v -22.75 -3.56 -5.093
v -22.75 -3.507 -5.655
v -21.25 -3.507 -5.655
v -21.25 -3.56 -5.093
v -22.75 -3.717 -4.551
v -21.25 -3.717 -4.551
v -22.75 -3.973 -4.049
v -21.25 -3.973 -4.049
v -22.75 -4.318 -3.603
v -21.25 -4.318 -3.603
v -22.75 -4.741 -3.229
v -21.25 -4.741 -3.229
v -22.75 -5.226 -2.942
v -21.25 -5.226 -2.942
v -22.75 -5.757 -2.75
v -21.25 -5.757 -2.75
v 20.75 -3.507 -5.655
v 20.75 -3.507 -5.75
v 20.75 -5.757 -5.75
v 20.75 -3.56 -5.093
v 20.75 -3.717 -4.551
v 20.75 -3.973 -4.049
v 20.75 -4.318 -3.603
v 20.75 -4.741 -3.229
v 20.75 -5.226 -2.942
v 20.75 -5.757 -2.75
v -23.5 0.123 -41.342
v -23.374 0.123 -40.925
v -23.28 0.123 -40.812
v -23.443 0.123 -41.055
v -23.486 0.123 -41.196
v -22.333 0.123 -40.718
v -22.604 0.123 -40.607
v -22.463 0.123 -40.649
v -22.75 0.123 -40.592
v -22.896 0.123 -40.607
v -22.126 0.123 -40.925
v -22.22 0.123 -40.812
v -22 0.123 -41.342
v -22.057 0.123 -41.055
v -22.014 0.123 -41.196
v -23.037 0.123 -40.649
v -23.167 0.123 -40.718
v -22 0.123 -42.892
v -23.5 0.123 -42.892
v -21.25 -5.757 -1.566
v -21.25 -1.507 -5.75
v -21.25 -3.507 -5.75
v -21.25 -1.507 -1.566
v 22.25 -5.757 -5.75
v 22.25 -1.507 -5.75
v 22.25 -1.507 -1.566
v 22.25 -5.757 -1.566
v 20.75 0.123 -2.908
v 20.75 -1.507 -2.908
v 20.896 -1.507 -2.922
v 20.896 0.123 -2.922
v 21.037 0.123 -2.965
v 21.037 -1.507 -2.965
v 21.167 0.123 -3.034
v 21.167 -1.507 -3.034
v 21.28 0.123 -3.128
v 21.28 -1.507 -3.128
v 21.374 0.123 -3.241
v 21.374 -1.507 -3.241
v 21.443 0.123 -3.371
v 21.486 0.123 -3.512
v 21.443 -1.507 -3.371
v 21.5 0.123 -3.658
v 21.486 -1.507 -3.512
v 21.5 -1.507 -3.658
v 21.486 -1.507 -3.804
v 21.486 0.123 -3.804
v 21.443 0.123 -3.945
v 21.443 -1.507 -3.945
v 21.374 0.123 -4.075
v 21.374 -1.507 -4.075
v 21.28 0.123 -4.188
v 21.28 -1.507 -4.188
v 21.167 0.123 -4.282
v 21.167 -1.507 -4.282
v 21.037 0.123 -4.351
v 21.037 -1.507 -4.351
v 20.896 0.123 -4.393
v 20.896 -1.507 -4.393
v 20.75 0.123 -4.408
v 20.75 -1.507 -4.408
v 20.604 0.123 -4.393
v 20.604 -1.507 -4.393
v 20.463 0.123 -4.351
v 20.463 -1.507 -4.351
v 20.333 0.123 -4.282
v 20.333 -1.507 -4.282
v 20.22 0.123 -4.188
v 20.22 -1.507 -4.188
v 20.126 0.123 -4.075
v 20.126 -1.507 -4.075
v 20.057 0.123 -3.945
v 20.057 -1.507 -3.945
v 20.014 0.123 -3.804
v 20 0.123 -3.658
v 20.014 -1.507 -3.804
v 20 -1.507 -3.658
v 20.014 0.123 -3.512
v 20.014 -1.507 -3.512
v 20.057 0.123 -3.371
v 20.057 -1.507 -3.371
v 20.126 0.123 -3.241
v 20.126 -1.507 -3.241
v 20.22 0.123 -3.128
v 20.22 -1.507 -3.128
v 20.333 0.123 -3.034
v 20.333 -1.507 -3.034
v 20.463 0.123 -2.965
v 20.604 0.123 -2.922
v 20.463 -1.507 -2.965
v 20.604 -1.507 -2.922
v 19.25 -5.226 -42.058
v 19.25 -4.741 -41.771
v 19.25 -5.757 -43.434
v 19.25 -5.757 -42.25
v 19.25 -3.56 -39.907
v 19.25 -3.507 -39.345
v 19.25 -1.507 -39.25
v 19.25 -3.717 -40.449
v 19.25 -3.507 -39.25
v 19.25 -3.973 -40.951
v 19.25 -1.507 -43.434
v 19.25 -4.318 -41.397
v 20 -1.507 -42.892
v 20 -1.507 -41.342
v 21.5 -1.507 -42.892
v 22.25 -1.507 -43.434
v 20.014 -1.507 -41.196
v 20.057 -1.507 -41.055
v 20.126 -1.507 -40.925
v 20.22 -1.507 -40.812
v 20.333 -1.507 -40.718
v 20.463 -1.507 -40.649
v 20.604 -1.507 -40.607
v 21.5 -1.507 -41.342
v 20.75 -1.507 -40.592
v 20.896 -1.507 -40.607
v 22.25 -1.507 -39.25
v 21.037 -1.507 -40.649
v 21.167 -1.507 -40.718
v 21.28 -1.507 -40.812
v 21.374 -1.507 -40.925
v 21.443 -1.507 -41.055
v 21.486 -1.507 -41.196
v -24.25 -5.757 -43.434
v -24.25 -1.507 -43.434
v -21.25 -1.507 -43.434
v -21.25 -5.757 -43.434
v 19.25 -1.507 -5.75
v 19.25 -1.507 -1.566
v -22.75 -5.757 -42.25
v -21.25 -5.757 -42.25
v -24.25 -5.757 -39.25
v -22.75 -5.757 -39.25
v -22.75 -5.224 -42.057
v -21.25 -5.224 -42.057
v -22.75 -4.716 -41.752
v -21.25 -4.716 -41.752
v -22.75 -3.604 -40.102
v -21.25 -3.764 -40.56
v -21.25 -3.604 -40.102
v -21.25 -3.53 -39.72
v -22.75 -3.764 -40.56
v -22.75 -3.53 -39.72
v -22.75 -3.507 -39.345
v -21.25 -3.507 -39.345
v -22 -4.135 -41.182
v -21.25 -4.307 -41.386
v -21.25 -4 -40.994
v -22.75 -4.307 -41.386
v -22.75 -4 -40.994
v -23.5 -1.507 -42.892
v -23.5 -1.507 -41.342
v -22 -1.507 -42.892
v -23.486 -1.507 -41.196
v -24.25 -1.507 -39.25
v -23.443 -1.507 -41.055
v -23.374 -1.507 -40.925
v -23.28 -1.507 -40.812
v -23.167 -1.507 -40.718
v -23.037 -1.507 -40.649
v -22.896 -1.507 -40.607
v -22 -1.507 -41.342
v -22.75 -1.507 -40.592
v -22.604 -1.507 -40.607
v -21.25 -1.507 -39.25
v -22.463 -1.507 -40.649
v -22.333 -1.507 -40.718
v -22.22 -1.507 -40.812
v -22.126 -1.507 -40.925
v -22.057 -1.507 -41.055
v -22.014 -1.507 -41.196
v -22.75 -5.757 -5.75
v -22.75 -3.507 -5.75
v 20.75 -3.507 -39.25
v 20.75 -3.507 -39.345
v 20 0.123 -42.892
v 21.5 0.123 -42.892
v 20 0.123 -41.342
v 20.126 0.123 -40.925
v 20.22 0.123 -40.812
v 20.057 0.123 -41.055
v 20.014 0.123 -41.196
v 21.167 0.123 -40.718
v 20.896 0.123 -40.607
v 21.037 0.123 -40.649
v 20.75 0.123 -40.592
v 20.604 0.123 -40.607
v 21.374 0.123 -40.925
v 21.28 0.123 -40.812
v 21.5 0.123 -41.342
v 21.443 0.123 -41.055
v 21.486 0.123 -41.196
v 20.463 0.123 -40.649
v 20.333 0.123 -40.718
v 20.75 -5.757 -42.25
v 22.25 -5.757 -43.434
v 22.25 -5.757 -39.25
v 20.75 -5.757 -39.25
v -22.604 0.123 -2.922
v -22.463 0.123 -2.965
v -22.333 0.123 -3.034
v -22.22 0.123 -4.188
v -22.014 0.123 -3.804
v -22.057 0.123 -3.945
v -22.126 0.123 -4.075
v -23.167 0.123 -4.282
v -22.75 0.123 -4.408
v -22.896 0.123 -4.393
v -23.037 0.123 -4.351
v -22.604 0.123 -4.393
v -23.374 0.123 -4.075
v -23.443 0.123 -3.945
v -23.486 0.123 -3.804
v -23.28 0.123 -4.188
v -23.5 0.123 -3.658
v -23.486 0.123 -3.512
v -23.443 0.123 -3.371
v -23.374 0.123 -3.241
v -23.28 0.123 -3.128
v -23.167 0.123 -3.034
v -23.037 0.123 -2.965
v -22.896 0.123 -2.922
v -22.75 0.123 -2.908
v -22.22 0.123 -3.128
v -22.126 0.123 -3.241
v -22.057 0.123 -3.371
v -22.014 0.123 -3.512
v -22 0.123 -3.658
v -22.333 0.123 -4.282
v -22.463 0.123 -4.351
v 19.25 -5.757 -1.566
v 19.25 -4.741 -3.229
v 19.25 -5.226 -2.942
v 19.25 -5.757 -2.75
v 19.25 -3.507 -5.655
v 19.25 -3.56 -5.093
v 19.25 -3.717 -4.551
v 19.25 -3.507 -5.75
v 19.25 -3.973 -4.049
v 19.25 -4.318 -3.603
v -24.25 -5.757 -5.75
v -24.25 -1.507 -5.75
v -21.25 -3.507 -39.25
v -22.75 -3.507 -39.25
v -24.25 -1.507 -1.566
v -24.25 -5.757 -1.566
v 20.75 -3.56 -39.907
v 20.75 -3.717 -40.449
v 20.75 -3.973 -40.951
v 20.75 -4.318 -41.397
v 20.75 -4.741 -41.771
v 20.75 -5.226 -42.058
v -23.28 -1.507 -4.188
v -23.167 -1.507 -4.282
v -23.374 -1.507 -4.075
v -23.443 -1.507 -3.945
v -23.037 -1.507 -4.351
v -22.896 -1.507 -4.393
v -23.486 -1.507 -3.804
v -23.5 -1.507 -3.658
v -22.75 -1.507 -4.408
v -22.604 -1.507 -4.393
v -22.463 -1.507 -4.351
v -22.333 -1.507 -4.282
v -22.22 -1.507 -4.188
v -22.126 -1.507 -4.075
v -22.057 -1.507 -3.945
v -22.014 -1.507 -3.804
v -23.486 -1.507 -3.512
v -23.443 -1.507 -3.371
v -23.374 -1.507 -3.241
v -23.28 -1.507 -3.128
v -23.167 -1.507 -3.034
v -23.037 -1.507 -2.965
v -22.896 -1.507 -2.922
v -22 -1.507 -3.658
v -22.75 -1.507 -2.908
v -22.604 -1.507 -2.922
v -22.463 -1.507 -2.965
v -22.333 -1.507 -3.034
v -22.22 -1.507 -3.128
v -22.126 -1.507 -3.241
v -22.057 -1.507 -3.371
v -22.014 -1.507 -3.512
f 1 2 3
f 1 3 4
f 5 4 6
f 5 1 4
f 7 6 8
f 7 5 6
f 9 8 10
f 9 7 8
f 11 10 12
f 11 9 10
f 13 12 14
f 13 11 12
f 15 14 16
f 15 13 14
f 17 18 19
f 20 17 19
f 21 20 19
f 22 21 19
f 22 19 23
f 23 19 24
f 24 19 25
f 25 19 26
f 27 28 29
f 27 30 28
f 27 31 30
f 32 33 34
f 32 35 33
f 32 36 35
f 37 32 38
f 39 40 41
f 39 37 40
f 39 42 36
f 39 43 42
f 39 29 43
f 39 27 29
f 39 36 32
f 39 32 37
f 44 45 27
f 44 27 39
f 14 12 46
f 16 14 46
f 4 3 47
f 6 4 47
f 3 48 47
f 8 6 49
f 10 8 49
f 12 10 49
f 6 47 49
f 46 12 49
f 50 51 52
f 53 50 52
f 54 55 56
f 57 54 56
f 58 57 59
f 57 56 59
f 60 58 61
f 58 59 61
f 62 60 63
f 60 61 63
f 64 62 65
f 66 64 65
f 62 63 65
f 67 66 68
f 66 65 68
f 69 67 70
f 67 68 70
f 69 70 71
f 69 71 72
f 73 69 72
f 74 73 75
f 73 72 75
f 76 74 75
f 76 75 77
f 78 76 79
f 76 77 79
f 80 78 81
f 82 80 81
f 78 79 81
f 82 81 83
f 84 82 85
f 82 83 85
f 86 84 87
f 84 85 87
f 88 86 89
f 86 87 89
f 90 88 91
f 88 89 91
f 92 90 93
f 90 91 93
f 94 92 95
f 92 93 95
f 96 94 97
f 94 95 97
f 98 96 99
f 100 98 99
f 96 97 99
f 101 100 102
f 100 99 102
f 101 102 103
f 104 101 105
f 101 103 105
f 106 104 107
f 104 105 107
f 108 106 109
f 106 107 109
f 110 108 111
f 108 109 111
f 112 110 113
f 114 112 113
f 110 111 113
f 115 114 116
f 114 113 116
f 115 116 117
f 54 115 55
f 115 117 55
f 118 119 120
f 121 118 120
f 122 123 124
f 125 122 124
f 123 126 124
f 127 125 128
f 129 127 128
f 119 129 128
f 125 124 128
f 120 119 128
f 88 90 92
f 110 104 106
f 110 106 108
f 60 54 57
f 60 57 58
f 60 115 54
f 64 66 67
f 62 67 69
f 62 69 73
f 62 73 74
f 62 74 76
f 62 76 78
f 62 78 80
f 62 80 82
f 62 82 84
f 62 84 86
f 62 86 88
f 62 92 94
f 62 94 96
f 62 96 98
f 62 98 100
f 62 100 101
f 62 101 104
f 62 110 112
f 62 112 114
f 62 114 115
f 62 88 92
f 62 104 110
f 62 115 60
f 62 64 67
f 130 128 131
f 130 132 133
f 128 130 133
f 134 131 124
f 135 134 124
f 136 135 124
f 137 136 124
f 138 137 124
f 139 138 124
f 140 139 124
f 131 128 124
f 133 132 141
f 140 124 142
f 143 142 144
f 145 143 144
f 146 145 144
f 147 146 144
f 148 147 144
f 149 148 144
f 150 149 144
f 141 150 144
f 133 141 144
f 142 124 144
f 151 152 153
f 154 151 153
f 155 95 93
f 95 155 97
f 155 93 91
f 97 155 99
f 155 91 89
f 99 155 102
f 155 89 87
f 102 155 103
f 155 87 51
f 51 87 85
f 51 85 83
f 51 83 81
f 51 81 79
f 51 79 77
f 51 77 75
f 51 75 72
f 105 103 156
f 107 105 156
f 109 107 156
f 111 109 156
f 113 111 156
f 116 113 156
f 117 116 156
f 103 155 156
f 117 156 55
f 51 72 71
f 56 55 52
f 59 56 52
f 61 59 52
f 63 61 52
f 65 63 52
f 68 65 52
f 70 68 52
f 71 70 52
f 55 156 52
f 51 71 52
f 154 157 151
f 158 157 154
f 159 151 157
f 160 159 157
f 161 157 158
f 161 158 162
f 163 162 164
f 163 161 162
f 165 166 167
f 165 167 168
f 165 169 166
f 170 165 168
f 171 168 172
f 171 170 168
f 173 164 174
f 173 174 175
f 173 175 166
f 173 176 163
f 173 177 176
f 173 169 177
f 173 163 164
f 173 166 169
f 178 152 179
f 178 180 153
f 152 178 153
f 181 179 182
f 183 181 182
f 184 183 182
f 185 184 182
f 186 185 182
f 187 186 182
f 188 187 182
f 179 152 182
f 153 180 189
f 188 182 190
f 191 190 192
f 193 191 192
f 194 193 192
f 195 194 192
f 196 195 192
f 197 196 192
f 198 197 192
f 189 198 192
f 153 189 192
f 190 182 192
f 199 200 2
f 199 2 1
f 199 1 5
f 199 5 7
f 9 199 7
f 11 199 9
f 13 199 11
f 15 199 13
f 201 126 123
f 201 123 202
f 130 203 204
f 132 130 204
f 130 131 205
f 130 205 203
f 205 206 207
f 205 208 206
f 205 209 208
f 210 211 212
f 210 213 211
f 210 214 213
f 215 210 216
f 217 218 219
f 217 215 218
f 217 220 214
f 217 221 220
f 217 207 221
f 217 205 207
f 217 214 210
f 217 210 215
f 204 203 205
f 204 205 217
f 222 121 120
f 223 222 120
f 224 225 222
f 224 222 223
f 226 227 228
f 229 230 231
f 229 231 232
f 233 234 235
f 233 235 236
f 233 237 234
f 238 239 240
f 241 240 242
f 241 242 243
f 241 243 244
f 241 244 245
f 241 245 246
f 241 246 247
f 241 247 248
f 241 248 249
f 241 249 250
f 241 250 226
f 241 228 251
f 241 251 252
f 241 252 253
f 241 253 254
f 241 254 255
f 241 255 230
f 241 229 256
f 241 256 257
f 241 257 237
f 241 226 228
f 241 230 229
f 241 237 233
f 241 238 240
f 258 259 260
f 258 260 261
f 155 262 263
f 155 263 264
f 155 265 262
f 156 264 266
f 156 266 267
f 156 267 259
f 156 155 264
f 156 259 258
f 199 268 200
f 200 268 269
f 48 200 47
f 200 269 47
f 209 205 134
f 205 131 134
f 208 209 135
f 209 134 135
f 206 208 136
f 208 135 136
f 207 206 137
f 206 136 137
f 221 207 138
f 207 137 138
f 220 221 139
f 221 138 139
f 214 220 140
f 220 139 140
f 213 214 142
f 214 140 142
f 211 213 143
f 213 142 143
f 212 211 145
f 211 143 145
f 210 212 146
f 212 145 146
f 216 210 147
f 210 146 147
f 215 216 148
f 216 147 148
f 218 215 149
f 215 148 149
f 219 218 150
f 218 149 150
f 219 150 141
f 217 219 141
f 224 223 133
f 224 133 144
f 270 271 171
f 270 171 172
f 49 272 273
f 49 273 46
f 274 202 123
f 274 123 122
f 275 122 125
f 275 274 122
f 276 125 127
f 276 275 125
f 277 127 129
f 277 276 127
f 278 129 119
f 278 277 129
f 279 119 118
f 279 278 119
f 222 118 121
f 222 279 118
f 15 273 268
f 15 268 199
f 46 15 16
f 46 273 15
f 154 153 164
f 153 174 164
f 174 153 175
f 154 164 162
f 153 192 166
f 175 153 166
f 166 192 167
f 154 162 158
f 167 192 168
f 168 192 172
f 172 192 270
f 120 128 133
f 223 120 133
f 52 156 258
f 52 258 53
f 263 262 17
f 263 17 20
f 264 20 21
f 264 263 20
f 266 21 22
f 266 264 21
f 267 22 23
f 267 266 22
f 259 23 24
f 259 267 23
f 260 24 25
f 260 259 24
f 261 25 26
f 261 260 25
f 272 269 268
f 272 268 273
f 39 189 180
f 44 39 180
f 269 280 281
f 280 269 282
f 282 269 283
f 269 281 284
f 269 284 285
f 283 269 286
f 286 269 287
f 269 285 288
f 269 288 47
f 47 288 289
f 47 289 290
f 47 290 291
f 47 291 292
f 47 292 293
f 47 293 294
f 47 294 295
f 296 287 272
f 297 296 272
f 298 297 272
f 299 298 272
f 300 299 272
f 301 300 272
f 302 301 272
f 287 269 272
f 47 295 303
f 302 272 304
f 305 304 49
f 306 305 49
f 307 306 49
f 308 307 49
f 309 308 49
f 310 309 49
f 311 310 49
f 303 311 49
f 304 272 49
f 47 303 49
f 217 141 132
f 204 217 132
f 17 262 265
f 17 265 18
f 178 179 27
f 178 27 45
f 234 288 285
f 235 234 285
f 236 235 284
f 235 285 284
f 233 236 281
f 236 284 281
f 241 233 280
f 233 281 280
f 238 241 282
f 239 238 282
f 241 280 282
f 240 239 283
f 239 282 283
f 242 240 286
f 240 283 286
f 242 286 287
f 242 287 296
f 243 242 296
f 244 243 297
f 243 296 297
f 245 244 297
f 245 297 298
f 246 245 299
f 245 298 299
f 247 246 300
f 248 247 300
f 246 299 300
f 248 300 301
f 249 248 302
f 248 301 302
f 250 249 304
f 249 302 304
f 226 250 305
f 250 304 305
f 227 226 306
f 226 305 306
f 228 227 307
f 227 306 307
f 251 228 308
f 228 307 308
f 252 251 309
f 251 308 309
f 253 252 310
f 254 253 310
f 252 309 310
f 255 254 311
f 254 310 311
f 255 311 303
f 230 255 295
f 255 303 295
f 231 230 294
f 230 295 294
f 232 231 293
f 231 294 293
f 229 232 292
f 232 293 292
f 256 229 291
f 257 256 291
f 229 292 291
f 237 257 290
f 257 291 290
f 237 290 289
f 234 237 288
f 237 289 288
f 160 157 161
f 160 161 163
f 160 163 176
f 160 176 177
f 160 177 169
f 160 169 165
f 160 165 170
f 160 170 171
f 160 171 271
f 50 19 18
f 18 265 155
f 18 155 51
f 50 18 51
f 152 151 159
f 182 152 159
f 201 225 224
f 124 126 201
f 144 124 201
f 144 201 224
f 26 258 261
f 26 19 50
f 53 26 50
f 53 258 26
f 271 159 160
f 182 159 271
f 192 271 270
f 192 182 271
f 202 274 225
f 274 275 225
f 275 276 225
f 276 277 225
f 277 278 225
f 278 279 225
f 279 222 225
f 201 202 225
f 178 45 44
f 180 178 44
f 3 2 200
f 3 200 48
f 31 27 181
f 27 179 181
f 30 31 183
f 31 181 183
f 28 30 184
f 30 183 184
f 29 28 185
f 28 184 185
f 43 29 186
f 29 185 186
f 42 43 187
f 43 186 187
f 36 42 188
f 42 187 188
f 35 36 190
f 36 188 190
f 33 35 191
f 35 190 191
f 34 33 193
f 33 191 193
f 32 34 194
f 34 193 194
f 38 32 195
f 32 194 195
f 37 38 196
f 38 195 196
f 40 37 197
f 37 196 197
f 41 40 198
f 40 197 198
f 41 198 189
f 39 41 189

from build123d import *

# Parameters (mm, degrees)
SKETCH1_W             = 3
SKETCH1_H             = 4.18419334
BOSS_EXTRUDE1_DEPTH   = 4.25
BOSS_EXTRUDE1_2_DEPTH = 4.25
BOSS_EXTRUDE1_3_DEPTH = 4.25
BOSS_EXTRUDE1_4_DEPTH = 4.25
SKETCH2_W             = 43.5
SKETCH2_H             = 39.5
CUT_EXTRUDE1_DEPTH    = 2.25
FILLET1_R             = 3
FILLET2_R             = 3
SKETCH3_R             = 0.75
BOSS_EXTRUDE2_DEPTH   = 1.63
FILLET3_R             = 3
FILLET4_START         = -22.75
FILLET4_DEPTH         = 1.5
SKETCH4_W             = 1.5
SKETCH4_H             = 1.55
BOSS_EXTRUDE3_DEPTH   = 1.63
SKETCH5_W             = 1.5
SKETCH5_H             = 1.55
BOSS_EXTRUDE4_DEPTH   = 1.63


with BuildPart() as part:
    # Sketch1 → Boss-Extrude1 (new body)
    with BuildSketch(Plane.XZ.offset(1.506798548)):
        with Locations((-22.75, -3.65790333)):
            Rectangle(SKETCH1_W, SKETCH1_H)
    extrude(amount=BOSS_EXTRUDE1_DEPTH)


with BuildPart() as body_2:
    # Sketch1 → Boss-Extrude1 2 (new body)
    with BuildSketch(Plane.XZ.offset(1.506798548)):
        with Locations((20.75, -3.65790333)):
            Rectangle(SKETCH1_W, SKETCH1_H)
    extrude(amount=BOSS_EXTRUDE1_2_DEPTH)


with BuildPart() as body_3:
    # Sketch1 → Boss-Extrude1 3 (new body)
    with BuildSketch(Plane.XZ.offset(1.506798548)):
        with Locations((20.75, -41.34209667)):
            Rectangle(SKETCH1_W, SKETCH1_H)
    extrude(amount=BOSS_EXTRUDE1_3_DEPTH)


with BuildPart() as body_4:
    # Sketch1 → Boss-Extrude1 4 (new body)
    with BuildSketch(Plane.XZ.offset(1.506798548)):
        with Locations((-22.75, -41.34209667)):
            Rectangle(SKETCH1_W, SKETCH1_H)
    extrude(amount=BOSS_EXTRUDE1_4_DEPTH)


with BuildPart() as cut_extrude1_tool:
    # Sketch2 → Cut-Extrude1 (new body)
    with BuildSketch(Plane.XZ.offset(5.756798548)):
        with Locations((-1, -22.5)):
            Rectangle(SKETCH2_W, SKETCH2_H)
    extrude(amount=-CUT_EXTRUDE1_DEPTH)


with BuildPart() as part_1:
    add(part.part)

    # Cut-Extrude1: cut by cut_extrude1_tool
    add(cut_extrude1_tool.part, mode=Mode.SUBTRACT)

    # Fillet1
    # the kernel refuses this fillet: 3 mm, written as the material it adds along each edge
    with BuildSketch(Plane(origin=(-22.75, -3.506798548, -2.75), x_dir=(0, 0, -1), z_dir=(1, 0, 0))) as fillet1_piece_1:
        with BuildLine():
            CenterArc((2.90473751, -3), FILLET1_R, 90, 75.522487814)
            Line((0, -2.25), (-0.05809475, -2.235))
            ThreePointArc((-0.05809475, -2.235), (-0.06, -1.125), (-0.06, 0))
            Line((-0.06, 0), (0, 0.06))
            Line((0, 0.06), (2.90473751, 0.06))
            Line((2.90473751, 0.06), (2.90473751, 0))
        make_face()
    extrude(amount=1.5)



with BuildPart() as body_2_1:
    add(body_2.part)

    # Cut-Extrude1: cut by cut_extrude1_tool
    add(cut_extrude1_tool.part, mode=Mode.SUBTRACT)

    # Fillet2
    # the kernel refuses this fillet: 3 mm, written as the material it adds along each edge
    with BuildSketch(Plane(origin=(19.25, -3.506798548, -2.75), x_dir=(0, 0, -1), z_dir=(1, 0, 0))) as fillet2_piece_1:
        with BuildLine():
            CenterArc((2.90473751, -3), FILLET2_R, 90, 75.522487814)
            Line((0, -2.25), (-0.05809475, -2.235))
            ThreePointArc((-0.05809475, -2.235), (-0.06, -1.125), (-0.06, 0))
            Line((-0.06, 0), (0, 0.06))
            Line((0, 0.06), (2.90473751, 0.06))
            Line((2.90473751, 0.06), (2.90473751, 0))
        make_face()
    extrude(amount=1.5)


with BuildPart() as body_3_1:
    add(body_3.part)

    # Cut-Extrude1: cut by cut_extrude1_tool
    add(cut_extrude1_tool.part, mode=Mode.SUBTRACT)

    # Fillet3
    # the kernel refuses this fillet: 3 mm, written as the material it adds along each edge
    with BuildSketch(Plane(origin=(20.75, -3.506798548, -42.25), x_dir=(0, 0, 1), z_dir=(-1, 0, 0))) as fillet3_piece_1:
        with BuildLine():
            CenterArc((2.90473751, -3), FILLET3_R, 90, 75.522487814)
            Line((0, -2.25), (-0.05809475, -2.235))
            ThreePointArc((-0.05809475, -2.235), (-0.06, -1.125), (-0.06, 0))
            Line((-0.06, 0), (0, 0.06))
            Line((0, 0.06), (2.90473751, 0.06))
            Line((2.90473751, 0.06), (2.90473751, 0))
        make_face()
    extrude(amount=1.5)


with BuildPart() as body_4_1:
    add(body_4.part)

    # Cut-Extrude1: cut by cut_extrude1_tool
    add(cut_extrude1_tool.part, mode=Mode.SUBTRACT)

    # Fillet4: read off the stored shape, not the designer's step
    # Fillet4 outline → Fillet4 (add)
    with BuildSketch(Plane.YZ.offset(FILLET4_START)):
        with BuildLine():
            add(Edge.make_bspline(
                [(-5.756798548, -42.25), (-3.506798548, -41.669052498), (-3.506798548, -39.34526249)],
                knots=[0, 0, 0, 1, 1, 1], degree=2, weights=[1, 0.790569415, 1]))
            Line((-5.756798548, -42.25), (-3.506798548, -42.25))
            Line((-3.506798548, -42.25), (-3.506798548, -39.34526249))
        make_face()
    extrude(amount=FILLET4_DEPTH)


with BuildPart() as part_2:
    add(part_1.part)

    add(body_2_1.part)  # Boss-Extrude2 merges body 2
    # Sketch3 → Boss-Extrude2 (add)
    with BuildSketch(Plane(origin=(0, -1.506798548, 0), x_dir=(1, 0, 0), z_dir=(0, 1, 0))):
        with Locations(Location((20.75, 3.65790333, 0), (0, 0, 270))):
            Circle(SKETCH3_R)
        with Locations(Location((-22.75, 3.65790333, 0), (0, 0, 90))):
            Circle(SKETCH3_R)
        with Locations(Location((20.75, 41.34209667, 0), (0, 0, 270))):
            Circle(SKETCH3_R)
        with Locations(Location((-22.75, 41.34209667, 0), (0, 0, 270))):
            Circle(SKETCH3_R)
    extrude(amount=BOSS_EXTRUDE2_DEPTH)


    add(body_4_1.part)  # Boss-Extrude3 merges body 4
    # Sketch4 → Boss-Extrude3 (add)
    with BuildSketch(Plane(origin=(0, 0.123201452, 0), x_dir=(1, 0, 0), z_dir=(0, 1, 0))):
        with Locations((-22.75, 42.11709667)):
            Rectangle(SKETCH4_W, SKETCH4_H)
    extrude(amount=-BOSS_EXTRUDE3_DEPTH)


    add(body_3_1.part)  # Boss-Extrude4 merges body 3
    # Sketch5 → Boss-Extrude4 (add)
    with BuildSketch(Plane(origin=(0, 0.123201452, 0), x_dir=(1, 0, 0), z_dir=(0, 1, 0))):
        with Locations((20.75, 42.11709667)):
            Rectangle(SKETCH5_W, SKETCH5_H)
    extrude(amount=-BOSS_EXTRUDE4_DEPTH)


solid = part_2.part
